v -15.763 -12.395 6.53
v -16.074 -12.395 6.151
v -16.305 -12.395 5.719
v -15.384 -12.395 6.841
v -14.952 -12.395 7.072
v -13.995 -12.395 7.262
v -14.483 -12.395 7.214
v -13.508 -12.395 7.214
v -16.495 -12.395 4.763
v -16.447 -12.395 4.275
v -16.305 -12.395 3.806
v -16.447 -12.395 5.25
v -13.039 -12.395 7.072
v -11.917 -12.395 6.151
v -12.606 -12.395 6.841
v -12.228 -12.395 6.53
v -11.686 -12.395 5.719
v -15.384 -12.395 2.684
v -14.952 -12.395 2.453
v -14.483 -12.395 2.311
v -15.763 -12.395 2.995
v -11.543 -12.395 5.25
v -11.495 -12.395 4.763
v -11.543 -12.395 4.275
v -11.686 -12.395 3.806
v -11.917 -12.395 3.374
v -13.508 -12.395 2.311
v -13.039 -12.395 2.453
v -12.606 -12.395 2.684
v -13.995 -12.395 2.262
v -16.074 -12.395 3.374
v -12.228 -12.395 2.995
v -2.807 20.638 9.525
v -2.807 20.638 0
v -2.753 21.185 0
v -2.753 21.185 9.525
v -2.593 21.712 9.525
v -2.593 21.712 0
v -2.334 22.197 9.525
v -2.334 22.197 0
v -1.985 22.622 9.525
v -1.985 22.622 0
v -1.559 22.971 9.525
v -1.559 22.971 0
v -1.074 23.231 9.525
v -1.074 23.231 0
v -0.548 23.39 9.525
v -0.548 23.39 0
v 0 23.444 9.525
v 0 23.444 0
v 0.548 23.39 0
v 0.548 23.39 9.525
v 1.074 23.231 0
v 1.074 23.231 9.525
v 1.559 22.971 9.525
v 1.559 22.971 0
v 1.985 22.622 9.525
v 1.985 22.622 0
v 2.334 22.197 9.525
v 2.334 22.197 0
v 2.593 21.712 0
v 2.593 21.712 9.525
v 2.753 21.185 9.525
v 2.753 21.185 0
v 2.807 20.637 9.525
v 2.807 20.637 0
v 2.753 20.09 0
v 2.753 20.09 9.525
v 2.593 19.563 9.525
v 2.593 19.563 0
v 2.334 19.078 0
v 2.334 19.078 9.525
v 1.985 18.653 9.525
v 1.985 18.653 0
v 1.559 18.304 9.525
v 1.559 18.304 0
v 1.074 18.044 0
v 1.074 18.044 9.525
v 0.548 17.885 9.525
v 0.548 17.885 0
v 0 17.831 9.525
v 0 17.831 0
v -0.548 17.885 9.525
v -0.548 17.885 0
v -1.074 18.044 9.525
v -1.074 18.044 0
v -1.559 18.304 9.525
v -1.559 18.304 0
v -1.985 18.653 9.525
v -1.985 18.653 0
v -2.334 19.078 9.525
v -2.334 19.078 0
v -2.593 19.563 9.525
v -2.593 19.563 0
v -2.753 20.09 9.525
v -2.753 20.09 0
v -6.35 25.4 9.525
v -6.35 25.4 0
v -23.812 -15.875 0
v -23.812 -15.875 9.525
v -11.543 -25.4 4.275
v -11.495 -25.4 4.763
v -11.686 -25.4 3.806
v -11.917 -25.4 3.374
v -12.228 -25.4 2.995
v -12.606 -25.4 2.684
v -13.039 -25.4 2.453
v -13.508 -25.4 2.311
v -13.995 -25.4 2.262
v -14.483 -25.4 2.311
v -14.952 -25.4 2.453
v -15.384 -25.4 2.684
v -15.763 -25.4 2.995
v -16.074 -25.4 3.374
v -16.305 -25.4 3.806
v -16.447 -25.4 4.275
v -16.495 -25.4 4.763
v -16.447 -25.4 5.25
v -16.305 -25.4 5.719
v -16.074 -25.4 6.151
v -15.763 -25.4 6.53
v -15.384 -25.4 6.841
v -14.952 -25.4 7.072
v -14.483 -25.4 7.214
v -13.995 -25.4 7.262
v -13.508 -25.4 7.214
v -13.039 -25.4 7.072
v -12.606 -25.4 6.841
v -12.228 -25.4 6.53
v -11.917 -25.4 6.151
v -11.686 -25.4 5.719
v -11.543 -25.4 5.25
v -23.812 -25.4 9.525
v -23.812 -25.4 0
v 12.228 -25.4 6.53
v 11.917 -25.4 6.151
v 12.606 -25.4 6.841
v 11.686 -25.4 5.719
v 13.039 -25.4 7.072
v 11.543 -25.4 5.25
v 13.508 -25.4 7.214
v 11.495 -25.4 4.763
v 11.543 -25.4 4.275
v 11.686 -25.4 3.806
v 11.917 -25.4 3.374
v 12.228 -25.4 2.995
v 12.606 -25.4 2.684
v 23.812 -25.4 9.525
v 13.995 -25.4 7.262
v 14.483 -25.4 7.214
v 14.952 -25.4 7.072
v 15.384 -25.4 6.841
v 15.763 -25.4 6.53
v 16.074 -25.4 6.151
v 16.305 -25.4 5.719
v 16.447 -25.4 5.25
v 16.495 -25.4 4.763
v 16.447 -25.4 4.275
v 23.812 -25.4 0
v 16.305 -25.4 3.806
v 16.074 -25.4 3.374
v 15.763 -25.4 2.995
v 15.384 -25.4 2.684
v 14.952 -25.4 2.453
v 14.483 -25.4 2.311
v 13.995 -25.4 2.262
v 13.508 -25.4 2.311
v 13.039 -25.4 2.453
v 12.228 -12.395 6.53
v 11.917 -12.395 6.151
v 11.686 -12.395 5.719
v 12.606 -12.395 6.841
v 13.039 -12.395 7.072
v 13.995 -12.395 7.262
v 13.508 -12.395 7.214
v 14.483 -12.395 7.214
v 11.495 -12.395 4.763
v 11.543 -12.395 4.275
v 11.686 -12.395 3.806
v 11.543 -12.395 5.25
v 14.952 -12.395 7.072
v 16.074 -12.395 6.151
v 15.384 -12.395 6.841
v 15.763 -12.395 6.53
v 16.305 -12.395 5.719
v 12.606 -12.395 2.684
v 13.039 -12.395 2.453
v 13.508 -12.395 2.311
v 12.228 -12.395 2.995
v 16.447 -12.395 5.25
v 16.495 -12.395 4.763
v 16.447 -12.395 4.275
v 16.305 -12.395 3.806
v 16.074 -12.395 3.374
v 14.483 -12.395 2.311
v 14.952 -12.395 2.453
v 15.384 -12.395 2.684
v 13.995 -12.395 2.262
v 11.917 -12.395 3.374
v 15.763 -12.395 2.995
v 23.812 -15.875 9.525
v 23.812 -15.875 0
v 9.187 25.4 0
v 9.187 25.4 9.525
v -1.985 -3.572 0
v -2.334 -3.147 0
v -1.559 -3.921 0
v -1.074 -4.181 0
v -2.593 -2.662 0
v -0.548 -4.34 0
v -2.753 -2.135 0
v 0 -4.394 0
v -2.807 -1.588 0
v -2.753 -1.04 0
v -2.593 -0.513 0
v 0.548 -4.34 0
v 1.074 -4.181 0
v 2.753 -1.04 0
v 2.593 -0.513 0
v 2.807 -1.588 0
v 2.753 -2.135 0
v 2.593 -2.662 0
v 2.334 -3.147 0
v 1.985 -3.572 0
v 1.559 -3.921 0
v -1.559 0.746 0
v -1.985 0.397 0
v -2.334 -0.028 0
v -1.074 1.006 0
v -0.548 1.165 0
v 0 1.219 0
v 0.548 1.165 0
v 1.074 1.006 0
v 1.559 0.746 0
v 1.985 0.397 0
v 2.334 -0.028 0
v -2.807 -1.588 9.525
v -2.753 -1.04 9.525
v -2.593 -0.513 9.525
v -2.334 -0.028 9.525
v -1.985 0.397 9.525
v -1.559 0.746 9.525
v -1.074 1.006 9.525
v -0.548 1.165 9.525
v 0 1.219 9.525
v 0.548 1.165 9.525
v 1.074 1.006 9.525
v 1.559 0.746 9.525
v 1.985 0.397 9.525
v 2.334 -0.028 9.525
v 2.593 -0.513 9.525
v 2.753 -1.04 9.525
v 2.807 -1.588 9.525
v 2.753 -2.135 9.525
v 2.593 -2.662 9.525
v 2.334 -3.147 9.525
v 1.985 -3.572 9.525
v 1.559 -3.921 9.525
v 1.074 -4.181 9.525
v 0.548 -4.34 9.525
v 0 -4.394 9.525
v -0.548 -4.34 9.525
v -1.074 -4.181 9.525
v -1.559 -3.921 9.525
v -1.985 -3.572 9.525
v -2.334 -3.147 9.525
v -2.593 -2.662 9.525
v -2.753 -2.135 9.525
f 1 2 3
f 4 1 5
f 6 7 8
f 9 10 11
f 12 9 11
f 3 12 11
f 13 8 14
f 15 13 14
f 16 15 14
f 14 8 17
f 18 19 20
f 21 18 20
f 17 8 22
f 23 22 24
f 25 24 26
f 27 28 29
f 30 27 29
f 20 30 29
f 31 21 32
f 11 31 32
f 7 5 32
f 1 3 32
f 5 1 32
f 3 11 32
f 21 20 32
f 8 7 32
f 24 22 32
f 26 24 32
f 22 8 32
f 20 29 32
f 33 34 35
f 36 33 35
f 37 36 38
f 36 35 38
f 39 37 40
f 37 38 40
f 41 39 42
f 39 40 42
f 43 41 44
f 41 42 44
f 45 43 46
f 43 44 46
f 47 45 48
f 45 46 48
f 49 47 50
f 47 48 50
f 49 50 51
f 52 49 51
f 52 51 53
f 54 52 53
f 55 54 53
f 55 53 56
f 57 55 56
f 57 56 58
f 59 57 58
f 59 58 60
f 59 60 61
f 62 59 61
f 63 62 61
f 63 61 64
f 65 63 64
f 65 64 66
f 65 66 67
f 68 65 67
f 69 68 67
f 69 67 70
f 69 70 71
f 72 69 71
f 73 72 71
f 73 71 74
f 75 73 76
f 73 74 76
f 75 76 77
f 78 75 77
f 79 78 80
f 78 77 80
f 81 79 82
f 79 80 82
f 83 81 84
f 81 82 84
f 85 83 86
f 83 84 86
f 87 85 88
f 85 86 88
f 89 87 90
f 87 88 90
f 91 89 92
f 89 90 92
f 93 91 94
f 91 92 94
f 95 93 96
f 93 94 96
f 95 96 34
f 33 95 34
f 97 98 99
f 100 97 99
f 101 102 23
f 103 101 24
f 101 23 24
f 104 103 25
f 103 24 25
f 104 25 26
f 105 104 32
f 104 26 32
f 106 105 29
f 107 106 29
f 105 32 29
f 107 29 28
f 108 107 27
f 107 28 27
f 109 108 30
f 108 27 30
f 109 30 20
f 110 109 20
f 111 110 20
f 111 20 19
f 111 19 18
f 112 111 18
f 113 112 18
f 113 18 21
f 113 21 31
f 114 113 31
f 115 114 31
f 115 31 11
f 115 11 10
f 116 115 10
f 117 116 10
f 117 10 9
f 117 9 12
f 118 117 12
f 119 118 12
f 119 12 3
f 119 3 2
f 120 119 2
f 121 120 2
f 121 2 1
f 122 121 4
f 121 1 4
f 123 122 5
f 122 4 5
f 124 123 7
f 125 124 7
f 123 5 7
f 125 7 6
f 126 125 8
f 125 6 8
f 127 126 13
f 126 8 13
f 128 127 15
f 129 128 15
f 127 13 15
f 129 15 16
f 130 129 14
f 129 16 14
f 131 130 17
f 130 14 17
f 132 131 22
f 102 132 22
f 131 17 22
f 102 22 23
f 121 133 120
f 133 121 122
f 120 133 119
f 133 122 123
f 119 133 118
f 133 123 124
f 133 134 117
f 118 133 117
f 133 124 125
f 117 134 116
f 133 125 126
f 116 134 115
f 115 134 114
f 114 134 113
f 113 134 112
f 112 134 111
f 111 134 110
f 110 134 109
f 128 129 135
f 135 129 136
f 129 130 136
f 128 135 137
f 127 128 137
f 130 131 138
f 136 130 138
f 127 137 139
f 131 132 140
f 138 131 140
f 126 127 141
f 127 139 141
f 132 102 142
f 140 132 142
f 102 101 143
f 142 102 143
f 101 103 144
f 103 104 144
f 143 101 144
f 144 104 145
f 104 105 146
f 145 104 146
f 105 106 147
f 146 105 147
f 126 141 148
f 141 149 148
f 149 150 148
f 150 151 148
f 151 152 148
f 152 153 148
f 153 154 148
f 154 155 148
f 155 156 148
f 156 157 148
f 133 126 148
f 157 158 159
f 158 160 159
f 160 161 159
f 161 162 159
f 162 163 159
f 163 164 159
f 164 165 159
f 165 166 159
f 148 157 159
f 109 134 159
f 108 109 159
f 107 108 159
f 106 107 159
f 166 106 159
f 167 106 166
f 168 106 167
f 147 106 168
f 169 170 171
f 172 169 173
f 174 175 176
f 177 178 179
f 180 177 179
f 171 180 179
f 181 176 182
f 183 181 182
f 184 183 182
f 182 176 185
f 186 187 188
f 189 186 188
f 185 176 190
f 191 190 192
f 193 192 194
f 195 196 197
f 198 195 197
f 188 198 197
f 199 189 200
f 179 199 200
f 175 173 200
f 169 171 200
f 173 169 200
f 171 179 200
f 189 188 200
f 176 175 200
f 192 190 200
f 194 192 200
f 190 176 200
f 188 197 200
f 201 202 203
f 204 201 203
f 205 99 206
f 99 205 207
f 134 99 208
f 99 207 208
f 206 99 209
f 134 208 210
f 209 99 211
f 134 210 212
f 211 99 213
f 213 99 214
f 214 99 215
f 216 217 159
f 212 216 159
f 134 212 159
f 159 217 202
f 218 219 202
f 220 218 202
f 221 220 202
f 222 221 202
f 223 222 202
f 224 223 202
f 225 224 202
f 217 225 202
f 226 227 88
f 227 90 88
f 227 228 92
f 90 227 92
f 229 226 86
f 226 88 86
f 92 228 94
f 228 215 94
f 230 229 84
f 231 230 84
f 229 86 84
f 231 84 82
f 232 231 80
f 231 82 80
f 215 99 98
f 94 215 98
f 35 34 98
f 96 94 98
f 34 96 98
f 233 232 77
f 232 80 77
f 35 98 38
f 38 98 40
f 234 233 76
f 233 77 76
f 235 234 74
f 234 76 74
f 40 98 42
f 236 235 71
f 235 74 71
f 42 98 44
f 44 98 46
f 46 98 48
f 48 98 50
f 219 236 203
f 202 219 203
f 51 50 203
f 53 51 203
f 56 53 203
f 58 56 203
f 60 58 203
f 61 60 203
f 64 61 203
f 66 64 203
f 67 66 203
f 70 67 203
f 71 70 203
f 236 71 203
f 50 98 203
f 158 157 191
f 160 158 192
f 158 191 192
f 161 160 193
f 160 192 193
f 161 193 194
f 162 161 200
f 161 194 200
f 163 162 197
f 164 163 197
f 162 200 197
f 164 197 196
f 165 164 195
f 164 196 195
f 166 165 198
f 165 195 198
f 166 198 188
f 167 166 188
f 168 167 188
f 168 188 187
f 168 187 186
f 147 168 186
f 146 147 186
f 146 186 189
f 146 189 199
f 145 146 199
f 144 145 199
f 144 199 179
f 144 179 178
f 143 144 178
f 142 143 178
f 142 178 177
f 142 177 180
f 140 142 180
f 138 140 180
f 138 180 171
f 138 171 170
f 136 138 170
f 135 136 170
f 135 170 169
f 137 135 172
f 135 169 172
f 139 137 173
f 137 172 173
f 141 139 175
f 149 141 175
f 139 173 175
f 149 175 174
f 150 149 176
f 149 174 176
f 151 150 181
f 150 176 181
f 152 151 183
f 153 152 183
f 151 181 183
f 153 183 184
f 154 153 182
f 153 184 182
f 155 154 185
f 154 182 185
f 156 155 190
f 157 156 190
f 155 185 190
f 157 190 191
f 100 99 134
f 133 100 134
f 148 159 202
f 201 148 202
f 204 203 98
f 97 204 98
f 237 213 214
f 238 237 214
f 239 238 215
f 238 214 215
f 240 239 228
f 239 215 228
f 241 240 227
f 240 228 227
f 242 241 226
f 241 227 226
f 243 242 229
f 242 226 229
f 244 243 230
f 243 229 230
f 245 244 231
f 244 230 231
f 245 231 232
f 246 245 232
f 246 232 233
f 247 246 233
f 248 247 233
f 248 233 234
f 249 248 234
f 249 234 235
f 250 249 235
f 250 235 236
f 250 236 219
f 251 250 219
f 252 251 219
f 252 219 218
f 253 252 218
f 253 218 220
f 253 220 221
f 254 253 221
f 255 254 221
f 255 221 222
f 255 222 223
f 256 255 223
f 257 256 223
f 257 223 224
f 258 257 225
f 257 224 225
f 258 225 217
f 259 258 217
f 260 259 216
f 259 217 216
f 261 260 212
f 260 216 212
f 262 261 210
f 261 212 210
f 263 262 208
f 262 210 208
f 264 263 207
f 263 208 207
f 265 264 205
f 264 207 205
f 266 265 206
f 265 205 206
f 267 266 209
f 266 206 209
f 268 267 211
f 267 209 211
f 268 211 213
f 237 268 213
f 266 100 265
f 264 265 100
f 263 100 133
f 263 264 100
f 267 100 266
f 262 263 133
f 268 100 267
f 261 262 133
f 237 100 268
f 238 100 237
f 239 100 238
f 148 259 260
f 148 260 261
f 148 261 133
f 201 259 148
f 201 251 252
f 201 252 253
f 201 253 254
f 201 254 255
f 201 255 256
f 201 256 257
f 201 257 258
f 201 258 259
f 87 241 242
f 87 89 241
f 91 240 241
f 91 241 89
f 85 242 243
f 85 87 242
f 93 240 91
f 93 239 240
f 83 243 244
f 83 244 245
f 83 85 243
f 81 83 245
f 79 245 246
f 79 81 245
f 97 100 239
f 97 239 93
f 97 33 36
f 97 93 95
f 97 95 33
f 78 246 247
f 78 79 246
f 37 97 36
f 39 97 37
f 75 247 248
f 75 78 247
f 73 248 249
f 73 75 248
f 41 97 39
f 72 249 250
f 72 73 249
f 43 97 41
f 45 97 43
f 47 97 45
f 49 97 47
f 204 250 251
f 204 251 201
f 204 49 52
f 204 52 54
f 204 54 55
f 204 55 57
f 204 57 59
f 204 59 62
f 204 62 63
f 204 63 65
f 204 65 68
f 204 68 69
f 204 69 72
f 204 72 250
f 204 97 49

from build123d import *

# Parameters (mm, degrees)
BOSS_EXTRUDE1_DEPTH       = 9.525
F_10_CLEARANCE_HOLE1_D    = 5.6134
M6X1_0_TAPPED_HOLE1_D     = 5
M6X1_0_TAPPED_HOLE1_DEPTH = 13.0048


with BuildPart() as part:
    # Sketch1 → Boss-Extrude1 (new body)
    with BuildSketch(Plane.XY):
        Polygon((23.8125, -25.4), (23.8125, -15.875), (9.186500373, 25.4), (-6.35, 25.4), (-23.8125, -15.875), (-23.8125, -25.4), align=None)
    extrude(amount=BOSS_EXTRUDE1_DEPTH)

    # #10 Clearance Hole1 (through all)
    with Locations(Plane.XY.offset(9.525)):
        with Locations((0, 20.6375), (0, -1.5875)):
            Hole(F_10_CLEARANCE_HOLE1_D / 2)

    # M6x1.0 Tapped Hole1
    with Locations(Plane(origin=(0, -25.4, 0), x_dir=(-1, 0, 0), z_dir=(0, -1, 0))):
        with Locations((13.9954, -4.7625), (-13.9954, -4.7625)):
            Hole(M6X1_0_TAPPED_HOLE1_D / 2, depth=M6X1_0_TAPPED_HOLE1_DEPTH)


solid = part.part
